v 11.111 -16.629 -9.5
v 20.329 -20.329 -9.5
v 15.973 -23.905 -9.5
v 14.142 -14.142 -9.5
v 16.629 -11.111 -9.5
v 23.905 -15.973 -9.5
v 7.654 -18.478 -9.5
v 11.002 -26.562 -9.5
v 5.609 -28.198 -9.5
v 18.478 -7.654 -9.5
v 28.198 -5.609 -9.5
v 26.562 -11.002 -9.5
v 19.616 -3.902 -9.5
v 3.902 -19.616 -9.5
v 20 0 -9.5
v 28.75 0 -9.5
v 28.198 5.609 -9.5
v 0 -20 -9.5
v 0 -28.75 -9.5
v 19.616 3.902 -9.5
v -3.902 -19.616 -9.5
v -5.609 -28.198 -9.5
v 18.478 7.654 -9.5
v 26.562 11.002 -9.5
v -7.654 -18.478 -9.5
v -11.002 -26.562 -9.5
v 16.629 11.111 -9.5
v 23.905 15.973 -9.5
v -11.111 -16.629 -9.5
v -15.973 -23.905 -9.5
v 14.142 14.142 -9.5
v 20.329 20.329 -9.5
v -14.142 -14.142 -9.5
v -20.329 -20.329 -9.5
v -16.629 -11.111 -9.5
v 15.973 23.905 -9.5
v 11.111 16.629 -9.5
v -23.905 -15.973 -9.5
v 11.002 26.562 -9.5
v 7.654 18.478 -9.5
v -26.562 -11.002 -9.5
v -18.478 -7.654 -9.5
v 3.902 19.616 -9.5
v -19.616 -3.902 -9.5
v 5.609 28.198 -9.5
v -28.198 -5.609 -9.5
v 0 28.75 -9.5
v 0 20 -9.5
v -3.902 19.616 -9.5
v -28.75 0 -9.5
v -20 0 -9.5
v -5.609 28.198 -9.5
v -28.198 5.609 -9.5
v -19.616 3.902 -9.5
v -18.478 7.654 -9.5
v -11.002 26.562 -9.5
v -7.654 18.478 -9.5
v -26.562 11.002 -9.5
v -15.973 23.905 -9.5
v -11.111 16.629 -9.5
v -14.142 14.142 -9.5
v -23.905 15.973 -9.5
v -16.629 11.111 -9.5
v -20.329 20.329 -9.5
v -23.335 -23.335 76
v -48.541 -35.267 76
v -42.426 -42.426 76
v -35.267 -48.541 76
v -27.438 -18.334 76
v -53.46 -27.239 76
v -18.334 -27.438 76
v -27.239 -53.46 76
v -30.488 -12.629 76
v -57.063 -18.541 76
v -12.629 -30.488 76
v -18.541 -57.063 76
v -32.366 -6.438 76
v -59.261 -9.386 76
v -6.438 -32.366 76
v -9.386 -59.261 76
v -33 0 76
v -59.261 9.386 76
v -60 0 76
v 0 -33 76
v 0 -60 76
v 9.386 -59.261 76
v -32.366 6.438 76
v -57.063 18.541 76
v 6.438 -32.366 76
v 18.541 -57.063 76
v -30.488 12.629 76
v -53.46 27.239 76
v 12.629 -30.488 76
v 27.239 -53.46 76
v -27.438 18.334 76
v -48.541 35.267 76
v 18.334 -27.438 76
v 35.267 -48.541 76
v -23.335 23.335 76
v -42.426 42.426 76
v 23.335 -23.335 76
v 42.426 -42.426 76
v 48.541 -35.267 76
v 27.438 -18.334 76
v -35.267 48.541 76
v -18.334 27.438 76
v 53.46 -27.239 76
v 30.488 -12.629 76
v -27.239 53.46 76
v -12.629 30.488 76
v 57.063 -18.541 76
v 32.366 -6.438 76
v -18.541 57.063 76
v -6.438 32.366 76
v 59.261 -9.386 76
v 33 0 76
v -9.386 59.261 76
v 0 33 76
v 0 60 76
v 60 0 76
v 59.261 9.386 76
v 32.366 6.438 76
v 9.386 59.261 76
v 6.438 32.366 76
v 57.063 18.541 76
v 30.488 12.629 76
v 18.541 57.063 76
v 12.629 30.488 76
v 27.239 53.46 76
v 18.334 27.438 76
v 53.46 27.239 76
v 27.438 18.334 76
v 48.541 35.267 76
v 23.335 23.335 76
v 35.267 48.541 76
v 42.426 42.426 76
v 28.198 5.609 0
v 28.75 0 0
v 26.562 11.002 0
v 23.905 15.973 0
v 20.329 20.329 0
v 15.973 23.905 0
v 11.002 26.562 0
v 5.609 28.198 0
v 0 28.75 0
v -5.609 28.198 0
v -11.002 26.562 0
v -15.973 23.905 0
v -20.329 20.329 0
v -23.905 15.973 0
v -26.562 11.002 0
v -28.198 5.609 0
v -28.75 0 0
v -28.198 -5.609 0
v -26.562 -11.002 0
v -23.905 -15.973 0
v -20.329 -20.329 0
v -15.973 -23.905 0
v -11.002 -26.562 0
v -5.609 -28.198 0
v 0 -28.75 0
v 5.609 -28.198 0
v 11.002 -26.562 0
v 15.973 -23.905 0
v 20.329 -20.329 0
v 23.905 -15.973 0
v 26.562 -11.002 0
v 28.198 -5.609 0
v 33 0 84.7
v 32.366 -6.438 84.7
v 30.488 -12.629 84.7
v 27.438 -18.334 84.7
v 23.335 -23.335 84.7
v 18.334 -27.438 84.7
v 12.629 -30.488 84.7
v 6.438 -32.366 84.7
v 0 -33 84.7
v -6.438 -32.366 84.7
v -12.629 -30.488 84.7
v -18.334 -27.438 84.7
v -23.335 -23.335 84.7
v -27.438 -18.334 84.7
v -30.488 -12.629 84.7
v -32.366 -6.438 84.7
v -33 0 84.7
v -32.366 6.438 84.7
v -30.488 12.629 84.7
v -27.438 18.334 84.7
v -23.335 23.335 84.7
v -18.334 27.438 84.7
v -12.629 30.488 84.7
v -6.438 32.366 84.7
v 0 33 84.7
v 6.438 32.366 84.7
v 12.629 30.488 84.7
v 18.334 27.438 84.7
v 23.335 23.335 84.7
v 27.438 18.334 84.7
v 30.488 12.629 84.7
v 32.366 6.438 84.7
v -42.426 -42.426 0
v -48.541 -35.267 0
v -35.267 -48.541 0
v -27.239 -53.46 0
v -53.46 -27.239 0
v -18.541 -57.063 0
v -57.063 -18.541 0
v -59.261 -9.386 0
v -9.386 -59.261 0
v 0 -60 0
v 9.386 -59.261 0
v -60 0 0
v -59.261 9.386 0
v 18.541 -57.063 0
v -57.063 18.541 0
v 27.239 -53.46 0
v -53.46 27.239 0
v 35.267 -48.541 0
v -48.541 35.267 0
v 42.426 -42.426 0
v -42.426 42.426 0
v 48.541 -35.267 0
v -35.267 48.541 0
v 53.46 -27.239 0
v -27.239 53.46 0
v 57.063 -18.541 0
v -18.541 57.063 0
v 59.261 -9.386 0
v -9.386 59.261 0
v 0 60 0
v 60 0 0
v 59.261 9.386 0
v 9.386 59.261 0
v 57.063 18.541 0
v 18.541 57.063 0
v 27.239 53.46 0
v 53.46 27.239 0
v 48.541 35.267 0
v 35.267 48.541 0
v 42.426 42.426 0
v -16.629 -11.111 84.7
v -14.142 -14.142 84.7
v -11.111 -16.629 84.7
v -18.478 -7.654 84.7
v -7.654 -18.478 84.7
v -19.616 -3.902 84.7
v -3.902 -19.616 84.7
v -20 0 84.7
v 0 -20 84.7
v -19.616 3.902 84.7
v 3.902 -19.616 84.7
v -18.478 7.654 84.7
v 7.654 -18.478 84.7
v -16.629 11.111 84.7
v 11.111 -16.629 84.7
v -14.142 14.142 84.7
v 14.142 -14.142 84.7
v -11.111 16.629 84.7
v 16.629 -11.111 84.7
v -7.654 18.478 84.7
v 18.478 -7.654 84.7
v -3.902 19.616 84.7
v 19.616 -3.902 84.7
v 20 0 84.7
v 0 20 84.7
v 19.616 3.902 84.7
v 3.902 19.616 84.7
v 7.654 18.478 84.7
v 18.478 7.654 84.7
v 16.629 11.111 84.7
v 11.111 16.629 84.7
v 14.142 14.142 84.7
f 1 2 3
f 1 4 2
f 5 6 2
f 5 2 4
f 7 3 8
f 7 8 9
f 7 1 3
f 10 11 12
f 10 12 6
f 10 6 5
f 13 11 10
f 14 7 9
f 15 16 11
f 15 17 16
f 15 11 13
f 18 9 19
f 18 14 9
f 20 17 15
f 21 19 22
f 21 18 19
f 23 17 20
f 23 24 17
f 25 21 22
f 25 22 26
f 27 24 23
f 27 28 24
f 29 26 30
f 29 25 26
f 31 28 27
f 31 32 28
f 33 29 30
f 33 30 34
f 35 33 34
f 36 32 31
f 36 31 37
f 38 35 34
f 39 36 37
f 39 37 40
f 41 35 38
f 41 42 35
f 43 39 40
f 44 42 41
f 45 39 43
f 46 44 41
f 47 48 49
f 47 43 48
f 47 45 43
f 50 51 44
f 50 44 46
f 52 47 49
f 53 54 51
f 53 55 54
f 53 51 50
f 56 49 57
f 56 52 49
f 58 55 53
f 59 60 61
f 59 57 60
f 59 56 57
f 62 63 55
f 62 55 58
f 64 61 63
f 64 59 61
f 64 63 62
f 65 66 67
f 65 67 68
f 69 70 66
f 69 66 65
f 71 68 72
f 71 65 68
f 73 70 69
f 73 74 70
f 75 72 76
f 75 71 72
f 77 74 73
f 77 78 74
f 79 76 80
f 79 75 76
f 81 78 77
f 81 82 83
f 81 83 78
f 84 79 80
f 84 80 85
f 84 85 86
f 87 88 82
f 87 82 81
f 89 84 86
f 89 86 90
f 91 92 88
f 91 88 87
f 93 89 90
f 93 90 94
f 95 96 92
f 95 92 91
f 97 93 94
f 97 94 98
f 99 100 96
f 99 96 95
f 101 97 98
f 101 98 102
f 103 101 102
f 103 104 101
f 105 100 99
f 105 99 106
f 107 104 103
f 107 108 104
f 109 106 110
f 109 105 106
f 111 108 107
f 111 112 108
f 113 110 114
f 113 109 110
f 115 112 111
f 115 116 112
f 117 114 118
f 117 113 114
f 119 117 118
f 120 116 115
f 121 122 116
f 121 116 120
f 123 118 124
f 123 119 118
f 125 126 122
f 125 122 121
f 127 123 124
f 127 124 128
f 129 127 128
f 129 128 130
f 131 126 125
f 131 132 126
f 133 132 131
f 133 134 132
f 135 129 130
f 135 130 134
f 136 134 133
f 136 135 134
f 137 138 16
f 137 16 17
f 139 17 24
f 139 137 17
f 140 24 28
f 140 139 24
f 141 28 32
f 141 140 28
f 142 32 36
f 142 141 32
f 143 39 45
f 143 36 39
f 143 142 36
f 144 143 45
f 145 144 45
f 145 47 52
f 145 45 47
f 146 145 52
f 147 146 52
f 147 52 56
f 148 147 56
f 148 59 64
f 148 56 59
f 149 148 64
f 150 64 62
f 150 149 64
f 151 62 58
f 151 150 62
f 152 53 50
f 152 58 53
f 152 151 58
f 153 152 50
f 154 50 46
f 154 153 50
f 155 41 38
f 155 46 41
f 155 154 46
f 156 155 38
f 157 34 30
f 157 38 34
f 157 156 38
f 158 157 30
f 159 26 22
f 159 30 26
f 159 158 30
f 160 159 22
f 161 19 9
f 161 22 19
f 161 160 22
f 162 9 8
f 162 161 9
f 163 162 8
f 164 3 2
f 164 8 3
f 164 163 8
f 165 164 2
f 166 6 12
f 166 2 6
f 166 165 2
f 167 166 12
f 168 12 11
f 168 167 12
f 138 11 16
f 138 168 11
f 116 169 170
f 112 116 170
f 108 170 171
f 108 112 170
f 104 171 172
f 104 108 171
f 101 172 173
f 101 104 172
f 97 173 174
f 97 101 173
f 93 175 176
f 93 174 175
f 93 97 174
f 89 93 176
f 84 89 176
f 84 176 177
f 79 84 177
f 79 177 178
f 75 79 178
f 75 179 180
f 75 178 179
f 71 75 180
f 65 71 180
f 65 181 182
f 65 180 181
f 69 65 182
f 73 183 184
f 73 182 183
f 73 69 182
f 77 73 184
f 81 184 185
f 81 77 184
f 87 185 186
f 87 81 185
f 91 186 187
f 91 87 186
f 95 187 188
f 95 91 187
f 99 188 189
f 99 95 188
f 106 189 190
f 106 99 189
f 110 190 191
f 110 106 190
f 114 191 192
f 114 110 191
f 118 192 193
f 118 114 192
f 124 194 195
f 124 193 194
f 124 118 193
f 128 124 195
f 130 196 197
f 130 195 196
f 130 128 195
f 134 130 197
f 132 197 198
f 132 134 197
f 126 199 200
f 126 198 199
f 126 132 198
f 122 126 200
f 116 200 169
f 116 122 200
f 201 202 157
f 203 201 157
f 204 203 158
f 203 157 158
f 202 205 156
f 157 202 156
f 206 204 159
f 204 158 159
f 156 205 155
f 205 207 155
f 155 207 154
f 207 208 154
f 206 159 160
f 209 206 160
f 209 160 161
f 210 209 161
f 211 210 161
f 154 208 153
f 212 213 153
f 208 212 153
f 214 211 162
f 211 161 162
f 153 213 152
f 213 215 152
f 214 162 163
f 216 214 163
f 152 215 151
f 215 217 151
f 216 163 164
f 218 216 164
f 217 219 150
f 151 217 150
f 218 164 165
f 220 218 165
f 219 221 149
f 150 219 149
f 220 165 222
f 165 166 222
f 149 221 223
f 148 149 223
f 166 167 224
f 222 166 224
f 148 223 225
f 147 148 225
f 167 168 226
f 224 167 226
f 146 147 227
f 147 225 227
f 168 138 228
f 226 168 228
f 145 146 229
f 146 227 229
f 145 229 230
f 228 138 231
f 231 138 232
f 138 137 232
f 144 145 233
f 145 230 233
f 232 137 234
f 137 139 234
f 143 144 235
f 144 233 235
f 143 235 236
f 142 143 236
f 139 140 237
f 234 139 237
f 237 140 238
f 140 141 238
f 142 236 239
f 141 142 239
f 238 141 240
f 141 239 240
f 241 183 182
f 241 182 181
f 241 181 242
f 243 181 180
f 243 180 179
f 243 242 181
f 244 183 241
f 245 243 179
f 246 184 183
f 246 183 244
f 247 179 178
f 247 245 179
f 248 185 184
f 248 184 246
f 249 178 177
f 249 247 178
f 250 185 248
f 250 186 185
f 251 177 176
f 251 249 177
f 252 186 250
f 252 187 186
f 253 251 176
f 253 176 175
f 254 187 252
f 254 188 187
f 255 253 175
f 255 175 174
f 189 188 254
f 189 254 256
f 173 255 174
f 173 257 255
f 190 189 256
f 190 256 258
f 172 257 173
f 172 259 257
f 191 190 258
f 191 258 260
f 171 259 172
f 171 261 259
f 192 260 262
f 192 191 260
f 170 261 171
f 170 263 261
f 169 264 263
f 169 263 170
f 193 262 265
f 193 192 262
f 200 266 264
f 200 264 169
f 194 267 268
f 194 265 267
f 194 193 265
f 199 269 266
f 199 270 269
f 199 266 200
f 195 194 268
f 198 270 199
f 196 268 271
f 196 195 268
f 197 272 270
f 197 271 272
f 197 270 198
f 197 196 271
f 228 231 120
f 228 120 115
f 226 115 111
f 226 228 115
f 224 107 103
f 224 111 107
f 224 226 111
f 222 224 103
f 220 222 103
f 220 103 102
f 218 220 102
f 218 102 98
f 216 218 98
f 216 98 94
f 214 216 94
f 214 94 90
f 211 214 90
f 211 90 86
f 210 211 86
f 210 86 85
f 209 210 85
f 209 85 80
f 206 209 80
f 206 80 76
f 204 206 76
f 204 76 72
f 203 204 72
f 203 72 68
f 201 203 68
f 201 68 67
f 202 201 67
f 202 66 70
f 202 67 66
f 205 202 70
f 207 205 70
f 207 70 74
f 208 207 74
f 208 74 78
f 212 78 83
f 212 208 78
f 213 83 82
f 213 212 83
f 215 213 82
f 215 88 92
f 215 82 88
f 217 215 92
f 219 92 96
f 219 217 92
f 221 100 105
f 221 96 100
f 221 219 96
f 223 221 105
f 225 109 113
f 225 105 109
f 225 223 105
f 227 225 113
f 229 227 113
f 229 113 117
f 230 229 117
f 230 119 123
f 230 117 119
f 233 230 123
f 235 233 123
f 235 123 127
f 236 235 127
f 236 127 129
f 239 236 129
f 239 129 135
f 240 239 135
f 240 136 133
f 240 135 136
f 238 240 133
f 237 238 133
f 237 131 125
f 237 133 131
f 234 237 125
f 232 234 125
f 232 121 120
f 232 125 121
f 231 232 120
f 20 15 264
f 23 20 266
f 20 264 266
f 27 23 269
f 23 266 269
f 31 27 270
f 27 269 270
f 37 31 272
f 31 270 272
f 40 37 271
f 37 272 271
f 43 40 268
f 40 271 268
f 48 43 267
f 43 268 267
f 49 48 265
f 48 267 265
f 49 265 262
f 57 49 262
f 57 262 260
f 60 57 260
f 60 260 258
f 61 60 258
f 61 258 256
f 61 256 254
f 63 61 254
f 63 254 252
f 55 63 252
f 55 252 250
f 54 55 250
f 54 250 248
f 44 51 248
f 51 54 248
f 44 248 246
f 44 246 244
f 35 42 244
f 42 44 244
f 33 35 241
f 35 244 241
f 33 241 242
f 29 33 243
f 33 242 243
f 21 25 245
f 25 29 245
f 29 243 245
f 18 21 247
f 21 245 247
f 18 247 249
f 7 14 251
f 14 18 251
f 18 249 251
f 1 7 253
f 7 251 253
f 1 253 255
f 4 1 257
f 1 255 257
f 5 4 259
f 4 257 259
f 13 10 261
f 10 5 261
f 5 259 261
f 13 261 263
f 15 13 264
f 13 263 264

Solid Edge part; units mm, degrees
sketch "Sketch1" plane through (0, 0, 0) normal (0, 0, 1) x (1, 0, 0)
  circle A0 centre (0, 0) radius 60
  circle A1 centre (0, 0) radius 20
extrude "Protrusion1" add sketch "Sketch1" along normal blind 76
sketch "Sketch2" plane through (0, 0, 76) normal (0, 0, 1) x (1, 0, 0)
  circle A0 centre (0, 0) radius 20
  circle A1 centre (0, 0) radius 33
extrude "ExtrudedProtrusion_2" add sketch "Sketch2" along normal blind 8.7
sketch "Sketch3" plane through (0, 0, 0) normal (0, 0, -1) x (1, 0, 0)
  circle A0 centre (0, 0) radius 20
  circle A1 centre (0, 0) radius 28.75
extrude "ExtrudedProtrusion_3" add sketch "Sketch3" along normal blind 9.5
properties material "Aluminum, 6061-T6"
